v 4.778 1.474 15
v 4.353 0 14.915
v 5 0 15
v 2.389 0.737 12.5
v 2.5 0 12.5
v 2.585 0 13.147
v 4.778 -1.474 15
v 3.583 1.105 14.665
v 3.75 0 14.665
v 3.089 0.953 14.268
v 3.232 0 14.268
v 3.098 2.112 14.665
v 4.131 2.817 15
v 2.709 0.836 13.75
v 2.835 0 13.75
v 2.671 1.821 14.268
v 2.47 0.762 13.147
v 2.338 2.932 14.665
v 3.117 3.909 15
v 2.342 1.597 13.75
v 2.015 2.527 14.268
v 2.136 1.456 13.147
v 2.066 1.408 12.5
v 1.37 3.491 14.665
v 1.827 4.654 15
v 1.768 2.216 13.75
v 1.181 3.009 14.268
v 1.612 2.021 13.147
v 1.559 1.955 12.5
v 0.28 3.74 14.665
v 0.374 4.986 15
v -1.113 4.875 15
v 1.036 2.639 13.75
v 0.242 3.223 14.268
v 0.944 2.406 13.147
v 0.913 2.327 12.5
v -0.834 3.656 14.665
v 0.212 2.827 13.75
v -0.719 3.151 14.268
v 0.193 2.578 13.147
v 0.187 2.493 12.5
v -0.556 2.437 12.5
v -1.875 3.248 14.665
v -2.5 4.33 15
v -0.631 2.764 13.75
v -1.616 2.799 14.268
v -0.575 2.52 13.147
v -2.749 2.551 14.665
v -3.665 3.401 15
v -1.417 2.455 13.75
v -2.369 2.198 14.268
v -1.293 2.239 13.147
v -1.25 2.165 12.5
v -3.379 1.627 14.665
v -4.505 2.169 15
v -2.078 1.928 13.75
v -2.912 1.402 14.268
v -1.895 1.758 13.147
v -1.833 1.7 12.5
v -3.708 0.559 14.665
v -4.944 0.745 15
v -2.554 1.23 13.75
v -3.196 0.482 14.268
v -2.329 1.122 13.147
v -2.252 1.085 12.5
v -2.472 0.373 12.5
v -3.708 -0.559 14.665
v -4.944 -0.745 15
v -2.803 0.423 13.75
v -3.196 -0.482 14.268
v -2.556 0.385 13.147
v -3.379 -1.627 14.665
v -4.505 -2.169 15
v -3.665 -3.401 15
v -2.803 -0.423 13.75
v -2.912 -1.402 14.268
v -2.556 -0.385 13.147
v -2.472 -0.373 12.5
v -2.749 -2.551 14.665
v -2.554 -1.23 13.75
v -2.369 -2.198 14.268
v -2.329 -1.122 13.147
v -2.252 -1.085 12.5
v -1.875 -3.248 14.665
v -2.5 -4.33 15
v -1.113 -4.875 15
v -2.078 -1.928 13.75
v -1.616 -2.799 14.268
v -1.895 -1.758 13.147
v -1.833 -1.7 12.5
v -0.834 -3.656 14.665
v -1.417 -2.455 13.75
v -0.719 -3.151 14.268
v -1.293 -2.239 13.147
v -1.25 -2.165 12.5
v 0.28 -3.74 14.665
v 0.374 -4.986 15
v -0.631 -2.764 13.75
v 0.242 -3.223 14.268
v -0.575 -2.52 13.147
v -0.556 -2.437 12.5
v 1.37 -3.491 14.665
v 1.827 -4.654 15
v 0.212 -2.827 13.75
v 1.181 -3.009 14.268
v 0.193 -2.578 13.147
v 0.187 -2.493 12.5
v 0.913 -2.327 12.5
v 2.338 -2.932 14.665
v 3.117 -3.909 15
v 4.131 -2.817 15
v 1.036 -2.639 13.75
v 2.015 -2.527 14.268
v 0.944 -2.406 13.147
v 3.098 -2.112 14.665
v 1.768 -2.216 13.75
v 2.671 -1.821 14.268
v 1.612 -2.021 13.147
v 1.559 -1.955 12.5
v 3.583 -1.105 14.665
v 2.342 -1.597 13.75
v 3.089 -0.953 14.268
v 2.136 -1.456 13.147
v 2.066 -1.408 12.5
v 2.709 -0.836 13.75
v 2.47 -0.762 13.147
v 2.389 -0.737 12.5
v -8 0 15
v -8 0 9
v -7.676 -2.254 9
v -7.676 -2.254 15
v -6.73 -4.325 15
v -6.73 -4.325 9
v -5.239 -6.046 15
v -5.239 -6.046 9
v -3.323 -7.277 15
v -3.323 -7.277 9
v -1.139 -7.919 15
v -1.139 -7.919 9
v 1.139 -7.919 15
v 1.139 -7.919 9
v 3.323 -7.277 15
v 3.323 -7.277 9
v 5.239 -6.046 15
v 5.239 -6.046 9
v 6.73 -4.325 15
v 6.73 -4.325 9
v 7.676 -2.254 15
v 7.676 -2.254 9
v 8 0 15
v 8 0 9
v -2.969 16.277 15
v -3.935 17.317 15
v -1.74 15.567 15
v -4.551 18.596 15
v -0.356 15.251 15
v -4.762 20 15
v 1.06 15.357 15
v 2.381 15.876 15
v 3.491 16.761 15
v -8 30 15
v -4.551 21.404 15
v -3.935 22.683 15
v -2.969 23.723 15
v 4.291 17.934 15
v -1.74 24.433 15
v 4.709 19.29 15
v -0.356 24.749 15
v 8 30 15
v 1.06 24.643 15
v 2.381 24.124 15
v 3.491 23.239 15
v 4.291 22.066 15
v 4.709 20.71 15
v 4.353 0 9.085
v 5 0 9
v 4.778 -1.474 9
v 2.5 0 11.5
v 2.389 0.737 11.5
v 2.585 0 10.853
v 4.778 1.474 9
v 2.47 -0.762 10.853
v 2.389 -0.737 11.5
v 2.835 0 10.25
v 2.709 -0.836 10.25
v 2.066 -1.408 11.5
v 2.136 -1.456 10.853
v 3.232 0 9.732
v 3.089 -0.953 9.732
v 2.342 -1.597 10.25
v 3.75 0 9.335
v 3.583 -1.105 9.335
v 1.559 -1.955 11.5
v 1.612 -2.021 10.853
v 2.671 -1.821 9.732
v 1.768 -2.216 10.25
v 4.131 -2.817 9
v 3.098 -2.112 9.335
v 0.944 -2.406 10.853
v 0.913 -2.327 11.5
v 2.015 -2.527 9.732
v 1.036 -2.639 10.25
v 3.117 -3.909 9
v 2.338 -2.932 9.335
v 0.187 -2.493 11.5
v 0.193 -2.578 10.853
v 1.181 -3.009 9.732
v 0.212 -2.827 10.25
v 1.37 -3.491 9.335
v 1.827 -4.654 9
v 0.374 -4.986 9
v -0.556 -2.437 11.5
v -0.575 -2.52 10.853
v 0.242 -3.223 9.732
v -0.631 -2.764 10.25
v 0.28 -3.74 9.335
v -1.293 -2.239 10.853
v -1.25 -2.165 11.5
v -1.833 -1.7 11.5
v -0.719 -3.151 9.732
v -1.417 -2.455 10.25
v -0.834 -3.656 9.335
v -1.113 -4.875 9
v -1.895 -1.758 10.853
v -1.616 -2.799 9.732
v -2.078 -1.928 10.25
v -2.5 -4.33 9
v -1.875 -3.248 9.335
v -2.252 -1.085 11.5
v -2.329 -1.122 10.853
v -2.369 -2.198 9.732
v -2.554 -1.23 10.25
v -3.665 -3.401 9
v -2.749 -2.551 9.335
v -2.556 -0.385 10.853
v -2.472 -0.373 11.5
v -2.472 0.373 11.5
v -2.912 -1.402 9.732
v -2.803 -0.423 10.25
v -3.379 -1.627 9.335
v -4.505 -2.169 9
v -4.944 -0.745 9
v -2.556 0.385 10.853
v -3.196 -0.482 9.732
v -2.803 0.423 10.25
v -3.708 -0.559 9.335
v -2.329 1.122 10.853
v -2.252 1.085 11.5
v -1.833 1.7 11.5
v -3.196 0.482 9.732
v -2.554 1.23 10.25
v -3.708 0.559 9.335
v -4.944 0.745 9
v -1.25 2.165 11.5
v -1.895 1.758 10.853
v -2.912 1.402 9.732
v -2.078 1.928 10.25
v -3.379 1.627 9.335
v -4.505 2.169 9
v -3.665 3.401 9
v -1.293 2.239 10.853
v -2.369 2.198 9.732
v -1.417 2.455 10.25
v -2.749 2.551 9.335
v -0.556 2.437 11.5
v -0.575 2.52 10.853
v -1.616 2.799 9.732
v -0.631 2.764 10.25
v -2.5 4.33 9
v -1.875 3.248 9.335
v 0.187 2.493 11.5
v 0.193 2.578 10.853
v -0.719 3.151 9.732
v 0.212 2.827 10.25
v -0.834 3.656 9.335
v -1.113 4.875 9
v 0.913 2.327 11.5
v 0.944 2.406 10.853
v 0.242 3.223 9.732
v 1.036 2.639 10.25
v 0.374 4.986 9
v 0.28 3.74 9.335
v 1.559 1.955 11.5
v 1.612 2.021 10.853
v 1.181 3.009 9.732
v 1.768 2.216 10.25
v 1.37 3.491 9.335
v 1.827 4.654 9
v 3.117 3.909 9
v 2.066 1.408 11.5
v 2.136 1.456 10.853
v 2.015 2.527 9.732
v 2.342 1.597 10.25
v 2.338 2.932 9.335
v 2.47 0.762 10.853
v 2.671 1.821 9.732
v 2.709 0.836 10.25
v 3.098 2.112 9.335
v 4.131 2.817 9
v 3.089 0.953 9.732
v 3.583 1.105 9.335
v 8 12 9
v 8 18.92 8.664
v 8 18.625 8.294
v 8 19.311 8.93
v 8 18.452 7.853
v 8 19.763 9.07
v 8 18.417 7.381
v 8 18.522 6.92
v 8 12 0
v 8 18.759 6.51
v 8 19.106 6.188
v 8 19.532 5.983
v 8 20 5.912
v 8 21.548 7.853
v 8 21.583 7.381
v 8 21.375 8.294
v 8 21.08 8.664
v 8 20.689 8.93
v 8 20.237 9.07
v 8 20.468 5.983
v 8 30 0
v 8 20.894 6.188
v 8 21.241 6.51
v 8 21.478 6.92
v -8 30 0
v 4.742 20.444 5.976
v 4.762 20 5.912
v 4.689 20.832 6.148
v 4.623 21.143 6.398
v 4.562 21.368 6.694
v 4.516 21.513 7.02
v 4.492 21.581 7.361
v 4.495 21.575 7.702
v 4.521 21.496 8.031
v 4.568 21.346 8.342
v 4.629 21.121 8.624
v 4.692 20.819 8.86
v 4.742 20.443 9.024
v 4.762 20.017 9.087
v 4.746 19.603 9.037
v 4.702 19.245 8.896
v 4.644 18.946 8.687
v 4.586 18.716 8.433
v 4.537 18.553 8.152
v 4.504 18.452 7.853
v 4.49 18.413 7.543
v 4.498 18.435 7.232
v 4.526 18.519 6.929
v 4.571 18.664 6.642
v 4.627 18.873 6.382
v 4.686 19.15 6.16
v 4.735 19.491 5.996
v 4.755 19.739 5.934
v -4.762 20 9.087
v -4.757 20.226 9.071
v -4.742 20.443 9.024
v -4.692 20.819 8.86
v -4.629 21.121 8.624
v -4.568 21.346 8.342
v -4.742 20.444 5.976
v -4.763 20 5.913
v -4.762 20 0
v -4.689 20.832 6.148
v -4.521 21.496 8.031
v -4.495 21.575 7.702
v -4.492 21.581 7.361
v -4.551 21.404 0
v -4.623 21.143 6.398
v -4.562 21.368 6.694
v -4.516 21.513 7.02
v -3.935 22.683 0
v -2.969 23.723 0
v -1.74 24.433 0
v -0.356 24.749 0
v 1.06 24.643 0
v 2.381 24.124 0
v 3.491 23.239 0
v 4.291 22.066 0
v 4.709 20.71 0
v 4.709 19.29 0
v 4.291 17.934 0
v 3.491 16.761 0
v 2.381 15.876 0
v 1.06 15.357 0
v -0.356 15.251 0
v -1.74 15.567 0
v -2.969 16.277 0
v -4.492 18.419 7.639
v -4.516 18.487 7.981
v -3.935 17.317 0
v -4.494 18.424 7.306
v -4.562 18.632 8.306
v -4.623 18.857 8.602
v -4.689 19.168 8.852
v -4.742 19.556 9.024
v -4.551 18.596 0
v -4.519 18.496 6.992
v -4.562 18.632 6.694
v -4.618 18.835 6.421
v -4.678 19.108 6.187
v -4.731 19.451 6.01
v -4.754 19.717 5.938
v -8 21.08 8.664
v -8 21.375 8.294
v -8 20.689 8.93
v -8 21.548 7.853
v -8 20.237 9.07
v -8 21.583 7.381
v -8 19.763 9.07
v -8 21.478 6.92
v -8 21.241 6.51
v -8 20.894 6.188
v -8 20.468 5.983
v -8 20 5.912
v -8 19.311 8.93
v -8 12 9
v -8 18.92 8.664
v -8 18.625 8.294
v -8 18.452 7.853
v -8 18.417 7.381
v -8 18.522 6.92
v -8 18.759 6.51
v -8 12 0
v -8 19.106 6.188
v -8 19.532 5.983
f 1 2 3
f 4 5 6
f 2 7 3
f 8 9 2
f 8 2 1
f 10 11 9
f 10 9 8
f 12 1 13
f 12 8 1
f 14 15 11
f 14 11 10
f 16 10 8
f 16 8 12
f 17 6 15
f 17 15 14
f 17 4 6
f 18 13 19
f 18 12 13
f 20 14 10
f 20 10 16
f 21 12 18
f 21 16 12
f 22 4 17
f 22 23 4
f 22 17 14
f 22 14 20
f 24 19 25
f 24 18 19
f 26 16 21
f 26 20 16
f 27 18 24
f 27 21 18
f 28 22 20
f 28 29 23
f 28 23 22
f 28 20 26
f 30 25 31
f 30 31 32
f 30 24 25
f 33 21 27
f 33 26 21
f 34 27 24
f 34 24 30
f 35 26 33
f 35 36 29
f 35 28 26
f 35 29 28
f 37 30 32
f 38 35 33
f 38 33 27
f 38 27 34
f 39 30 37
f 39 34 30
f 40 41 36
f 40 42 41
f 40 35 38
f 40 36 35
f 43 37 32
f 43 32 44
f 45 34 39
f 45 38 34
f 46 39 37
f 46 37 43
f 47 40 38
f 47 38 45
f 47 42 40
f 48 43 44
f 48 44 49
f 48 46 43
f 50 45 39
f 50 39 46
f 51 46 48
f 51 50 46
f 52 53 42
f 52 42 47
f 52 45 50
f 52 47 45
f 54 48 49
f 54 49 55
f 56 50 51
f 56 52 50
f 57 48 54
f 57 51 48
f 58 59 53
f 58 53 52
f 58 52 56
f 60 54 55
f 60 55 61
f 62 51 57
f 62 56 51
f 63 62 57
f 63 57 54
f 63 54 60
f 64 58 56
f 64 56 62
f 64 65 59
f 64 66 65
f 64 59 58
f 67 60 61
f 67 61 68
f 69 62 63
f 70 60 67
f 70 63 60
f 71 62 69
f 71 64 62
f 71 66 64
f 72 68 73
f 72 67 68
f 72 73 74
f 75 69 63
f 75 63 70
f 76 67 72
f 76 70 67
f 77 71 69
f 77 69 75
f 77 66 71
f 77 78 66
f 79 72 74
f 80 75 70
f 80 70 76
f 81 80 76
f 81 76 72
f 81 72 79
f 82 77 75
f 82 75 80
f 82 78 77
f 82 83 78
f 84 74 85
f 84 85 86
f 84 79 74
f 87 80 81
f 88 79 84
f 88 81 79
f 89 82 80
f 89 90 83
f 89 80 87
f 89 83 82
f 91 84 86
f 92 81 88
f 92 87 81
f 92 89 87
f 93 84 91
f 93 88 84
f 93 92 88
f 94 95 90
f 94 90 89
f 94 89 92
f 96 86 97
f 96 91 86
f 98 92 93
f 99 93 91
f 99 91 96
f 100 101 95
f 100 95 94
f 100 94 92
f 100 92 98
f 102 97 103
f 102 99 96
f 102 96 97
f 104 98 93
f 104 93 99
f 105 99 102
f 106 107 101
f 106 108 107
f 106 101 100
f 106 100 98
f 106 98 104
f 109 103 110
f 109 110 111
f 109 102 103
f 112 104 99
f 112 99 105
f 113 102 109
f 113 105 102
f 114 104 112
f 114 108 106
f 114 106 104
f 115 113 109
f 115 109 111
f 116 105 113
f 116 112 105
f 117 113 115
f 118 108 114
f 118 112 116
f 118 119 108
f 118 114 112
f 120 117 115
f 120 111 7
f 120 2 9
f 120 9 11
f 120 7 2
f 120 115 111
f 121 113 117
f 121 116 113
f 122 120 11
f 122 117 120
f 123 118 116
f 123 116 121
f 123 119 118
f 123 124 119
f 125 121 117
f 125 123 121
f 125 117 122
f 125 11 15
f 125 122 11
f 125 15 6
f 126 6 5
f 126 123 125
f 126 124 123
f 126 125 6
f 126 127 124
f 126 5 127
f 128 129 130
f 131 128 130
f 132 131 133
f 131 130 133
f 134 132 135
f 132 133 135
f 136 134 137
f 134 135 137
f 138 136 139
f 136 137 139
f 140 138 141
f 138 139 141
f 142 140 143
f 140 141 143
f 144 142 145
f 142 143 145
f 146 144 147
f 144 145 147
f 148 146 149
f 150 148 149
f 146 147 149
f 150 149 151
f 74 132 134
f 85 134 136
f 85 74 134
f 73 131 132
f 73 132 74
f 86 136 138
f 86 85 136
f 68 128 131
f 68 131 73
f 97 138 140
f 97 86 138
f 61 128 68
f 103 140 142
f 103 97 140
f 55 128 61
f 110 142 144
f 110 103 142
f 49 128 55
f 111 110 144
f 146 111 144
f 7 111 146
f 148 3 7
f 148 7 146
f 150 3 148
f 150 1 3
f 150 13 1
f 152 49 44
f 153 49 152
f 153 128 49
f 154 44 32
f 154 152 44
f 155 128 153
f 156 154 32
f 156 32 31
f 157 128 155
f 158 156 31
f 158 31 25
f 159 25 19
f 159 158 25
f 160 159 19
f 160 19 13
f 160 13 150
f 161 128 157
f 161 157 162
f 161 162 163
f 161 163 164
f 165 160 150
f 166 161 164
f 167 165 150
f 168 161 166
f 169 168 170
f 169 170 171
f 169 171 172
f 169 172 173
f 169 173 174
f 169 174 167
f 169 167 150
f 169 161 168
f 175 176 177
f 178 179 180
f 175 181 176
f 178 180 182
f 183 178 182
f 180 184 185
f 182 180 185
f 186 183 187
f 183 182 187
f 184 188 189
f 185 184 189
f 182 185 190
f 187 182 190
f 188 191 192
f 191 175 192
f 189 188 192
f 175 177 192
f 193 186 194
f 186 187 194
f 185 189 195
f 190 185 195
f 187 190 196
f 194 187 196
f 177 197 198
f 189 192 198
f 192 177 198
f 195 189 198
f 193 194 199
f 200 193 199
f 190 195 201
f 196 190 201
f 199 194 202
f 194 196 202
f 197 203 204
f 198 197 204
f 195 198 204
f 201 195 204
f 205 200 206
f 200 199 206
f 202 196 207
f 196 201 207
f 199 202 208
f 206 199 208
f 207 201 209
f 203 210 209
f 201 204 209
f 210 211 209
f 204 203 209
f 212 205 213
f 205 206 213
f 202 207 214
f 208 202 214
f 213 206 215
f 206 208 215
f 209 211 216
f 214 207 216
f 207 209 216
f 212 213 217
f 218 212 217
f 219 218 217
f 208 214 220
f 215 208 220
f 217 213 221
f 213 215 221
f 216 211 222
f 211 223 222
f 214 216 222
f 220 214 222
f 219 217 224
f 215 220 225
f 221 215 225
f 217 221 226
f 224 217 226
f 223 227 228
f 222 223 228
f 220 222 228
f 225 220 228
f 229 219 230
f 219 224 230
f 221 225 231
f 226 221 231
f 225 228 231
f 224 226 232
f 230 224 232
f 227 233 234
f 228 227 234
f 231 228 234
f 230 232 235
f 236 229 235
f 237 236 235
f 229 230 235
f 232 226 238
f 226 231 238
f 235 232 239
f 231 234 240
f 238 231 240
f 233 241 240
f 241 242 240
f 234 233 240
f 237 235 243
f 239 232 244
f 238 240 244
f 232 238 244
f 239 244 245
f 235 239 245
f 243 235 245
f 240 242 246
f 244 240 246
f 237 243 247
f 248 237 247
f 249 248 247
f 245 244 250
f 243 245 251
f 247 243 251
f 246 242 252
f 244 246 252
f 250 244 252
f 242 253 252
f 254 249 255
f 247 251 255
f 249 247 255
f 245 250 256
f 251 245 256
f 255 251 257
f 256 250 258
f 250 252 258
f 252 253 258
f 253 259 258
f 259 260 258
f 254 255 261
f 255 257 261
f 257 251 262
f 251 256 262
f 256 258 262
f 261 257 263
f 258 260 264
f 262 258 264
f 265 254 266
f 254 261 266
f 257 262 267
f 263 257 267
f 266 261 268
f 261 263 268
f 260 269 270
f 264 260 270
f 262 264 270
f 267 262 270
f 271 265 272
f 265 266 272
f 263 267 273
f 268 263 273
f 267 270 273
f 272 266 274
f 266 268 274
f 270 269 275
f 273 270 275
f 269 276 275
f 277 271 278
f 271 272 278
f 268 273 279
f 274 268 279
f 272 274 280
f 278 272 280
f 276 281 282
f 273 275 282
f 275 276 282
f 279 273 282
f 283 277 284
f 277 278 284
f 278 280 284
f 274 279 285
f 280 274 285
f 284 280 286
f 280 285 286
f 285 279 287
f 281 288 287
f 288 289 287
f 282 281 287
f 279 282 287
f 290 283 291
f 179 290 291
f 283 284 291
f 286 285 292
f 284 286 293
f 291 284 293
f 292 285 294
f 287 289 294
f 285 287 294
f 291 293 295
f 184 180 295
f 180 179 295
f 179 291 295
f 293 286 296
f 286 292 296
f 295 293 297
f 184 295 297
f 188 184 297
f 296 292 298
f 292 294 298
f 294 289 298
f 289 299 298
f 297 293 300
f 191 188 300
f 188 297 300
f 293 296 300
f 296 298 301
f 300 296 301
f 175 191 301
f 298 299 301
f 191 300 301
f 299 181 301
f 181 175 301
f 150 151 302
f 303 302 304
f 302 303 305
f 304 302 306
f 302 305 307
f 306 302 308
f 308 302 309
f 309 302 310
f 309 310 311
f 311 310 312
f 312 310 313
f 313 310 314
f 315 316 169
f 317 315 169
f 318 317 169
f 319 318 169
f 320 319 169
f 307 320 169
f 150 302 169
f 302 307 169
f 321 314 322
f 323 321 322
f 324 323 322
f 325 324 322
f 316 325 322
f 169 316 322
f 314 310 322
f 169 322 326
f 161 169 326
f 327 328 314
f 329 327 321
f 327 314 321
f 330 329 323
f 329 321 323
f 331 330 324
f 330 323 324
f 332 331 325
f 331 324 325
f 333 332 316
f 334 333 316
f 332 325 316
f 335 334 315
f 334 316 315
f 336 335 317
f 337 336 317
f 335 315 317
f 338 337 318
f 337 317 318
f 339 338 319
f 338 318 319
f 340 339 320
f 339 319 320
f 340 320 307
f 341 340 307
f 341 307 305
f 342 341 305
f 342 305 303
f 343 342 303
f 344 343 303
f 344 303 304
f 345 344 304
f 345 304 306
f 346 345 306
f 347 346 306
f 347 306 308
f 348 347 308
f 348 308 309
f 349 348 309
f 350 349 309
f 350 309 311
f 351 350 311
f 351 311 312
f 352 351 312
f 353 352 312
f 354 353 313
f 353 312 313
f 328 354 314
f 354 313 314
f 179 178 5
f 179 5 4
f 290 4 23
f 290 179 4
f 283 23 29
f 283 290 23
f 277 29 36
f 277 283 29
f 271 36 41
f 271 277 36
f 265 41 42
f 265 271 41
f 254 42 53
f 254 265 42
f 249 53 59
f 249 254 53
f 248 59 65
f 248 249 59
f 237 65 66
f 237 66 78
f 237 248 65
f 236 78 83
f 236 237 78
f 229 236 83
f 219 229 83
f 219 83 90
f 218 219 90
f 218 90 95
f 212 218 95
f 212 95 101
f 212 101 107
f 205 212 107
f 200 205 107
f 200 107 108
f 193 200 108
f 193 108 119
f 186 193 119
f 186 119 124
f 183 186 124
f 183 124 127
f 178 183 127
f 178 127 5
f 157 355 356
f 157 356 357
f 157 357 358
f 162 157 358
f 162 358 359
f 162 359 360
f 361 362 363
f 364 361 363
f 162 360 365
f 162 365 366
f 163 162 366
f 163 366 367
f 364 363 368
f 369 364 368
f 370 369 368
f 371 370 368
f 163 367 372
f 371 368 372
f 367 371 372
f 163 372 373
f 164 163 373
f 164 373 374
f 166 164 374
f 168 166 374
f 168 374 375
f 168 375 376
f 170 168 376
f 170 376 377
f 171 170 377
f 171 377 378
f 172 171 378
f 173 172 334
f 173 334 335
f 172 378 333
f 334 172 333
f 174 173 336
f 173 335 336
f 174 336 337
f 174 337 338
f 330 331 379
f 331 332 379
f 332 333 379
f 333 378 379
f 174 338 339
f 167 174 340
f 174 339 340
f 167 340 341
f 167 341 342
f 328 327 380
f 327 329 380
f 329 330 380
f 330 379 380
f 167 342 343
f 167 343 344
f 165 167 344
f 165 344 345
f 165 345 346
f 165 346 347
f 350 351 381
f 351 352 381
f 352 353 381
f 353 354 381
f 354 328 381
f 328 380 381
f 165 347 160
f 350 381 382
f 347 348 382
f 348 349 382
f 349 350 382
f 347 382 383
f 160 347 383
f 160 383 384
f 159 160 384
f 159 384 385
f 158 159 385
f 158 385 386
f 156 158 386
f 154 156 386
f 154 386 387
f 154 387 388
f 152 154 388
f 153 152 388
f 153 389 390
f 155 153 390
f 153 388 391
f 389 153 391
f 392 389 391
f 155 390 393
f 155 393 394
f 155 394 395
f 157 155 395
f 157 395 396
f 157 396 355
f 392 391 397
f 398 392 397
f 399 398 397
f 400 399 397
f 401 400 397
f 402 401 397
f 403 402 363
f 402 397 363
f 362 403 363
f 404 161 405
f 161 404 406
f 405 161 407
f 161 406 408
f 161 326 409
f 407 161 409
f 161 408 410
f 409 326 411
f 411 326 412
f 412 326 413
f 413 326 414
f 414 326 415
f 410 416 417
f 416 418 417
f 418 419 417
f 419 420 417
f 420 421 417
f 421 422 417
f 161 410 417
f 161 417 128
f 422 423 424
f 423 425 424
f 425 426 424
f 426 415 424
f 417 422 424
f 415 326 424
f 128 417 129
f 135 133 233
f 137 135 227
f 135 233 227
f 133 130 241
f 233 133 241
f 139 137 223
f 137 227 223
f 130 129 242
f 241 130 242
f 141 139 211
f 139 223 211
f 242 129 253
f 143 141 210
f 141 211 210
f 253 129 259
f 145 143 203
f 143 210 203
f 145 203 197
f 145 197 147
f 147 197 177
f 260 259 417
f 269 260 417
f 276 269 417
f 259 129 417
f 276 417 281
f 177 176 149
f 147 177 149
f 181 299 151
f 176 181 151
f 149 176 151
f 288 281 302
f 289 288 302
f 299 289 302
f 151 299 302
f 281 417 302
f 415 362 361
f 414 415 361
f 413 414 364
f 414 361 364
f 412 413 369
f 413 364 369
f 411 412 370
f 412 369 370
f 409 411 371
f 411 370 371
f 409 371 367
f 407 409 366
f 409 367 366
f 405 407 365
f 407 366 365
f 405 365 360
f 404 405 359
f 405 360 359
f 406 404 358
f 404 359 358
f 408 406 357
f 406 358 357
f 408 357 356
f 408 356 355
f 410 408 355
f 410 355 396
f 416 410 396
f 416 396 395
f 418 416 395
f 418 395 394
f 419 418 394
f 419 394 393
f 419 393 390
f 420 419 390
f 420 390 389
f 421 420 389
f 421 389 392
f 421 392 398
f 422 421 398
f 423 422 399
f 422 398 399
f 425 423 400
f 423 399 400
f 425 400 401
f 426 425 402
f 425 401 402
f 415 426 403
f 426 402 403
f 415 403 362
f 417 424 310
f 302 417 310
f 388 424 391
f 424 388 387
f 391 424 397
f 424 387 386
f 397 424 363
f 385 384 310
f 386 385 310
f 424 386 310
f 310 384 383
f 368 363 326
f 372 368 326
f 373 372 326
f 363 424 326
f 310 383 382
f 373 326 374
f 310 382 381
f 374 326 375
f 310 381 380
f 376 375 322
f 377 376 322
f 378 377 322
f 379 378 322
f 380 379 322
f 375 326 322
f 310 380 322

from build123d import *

# Parameters (mm, degrees)
SKETCH1_R                  = 2.5
BOSS_EXTRUDE1_DEPTH        = 15
SKETCH6_W                  = 16
SKETCH6_H                  = 20
CUT_EXTRUDE1_DEPTH         = 9
FILLET1_R                  = 2.5
F_3_8_0_3750_DOWEL_HOLE1_D = 9.525
F_1_8_0_1250_DOWEL_HOLE1_D = 3.175


with BuildPart() as part:
    # Sketch1 → Boss-Extrude1 (new body)
    with BuildSketch(Plane.XY):
        with BuildLine():
            Line((-8, 12), (-8, 0))
            ThreePointArc((-8, 0), (0, -8), (8, 0))
            Line((8, 0), (8, 12))
            Line((8, 12), (8, 30))
            Line((8, 30), (-8, 30))
            Line((-8, 30), (-8, 12))
        make_face()
        Circle(SKETCH1_R, mode=Mode.SUBTRACT)
    extrude(amount=BOSS_EXTRUDE1_DEPTH)

    # Sketch6 → Cut-Extrude1 (cut)
    with BuildSketch(Plane.XY):
        with Locations((0, 2)):
            Rectangle(SKETCH6_W, SKETCH6_H)
    extrude(amount=CUT_EXTRUDE1_DEPTH, mode=Mode.SUBTRACT)

    # Fillet1
    fillet1_edges = [part.edges().sort_by_distance(p)[0] for p in [
        (-2.5, 0, 15),
        (-2.5, 0, 9),
    ]]
    fillet(fillet1_edges, radius=FILLET1_R)

    # 3/8 (0.3750) Dowel Hole1 (through all)
    with Locations(Plane.XY.offset(15)):
        with Locations((0, 20)):
            Hole(F_3_8_0_3750_DOWEL_HOLE1_D / 2)

    # 1/8 (0.1250) Dowel Hole1 (through all)
    with Locations(Plane.ZY.offset(8)):
        with Locations((7.5, 20)):
            Hole(F_1_8_0_1250_DOWEL_HOLE1_D / 2)


solid = part.part
